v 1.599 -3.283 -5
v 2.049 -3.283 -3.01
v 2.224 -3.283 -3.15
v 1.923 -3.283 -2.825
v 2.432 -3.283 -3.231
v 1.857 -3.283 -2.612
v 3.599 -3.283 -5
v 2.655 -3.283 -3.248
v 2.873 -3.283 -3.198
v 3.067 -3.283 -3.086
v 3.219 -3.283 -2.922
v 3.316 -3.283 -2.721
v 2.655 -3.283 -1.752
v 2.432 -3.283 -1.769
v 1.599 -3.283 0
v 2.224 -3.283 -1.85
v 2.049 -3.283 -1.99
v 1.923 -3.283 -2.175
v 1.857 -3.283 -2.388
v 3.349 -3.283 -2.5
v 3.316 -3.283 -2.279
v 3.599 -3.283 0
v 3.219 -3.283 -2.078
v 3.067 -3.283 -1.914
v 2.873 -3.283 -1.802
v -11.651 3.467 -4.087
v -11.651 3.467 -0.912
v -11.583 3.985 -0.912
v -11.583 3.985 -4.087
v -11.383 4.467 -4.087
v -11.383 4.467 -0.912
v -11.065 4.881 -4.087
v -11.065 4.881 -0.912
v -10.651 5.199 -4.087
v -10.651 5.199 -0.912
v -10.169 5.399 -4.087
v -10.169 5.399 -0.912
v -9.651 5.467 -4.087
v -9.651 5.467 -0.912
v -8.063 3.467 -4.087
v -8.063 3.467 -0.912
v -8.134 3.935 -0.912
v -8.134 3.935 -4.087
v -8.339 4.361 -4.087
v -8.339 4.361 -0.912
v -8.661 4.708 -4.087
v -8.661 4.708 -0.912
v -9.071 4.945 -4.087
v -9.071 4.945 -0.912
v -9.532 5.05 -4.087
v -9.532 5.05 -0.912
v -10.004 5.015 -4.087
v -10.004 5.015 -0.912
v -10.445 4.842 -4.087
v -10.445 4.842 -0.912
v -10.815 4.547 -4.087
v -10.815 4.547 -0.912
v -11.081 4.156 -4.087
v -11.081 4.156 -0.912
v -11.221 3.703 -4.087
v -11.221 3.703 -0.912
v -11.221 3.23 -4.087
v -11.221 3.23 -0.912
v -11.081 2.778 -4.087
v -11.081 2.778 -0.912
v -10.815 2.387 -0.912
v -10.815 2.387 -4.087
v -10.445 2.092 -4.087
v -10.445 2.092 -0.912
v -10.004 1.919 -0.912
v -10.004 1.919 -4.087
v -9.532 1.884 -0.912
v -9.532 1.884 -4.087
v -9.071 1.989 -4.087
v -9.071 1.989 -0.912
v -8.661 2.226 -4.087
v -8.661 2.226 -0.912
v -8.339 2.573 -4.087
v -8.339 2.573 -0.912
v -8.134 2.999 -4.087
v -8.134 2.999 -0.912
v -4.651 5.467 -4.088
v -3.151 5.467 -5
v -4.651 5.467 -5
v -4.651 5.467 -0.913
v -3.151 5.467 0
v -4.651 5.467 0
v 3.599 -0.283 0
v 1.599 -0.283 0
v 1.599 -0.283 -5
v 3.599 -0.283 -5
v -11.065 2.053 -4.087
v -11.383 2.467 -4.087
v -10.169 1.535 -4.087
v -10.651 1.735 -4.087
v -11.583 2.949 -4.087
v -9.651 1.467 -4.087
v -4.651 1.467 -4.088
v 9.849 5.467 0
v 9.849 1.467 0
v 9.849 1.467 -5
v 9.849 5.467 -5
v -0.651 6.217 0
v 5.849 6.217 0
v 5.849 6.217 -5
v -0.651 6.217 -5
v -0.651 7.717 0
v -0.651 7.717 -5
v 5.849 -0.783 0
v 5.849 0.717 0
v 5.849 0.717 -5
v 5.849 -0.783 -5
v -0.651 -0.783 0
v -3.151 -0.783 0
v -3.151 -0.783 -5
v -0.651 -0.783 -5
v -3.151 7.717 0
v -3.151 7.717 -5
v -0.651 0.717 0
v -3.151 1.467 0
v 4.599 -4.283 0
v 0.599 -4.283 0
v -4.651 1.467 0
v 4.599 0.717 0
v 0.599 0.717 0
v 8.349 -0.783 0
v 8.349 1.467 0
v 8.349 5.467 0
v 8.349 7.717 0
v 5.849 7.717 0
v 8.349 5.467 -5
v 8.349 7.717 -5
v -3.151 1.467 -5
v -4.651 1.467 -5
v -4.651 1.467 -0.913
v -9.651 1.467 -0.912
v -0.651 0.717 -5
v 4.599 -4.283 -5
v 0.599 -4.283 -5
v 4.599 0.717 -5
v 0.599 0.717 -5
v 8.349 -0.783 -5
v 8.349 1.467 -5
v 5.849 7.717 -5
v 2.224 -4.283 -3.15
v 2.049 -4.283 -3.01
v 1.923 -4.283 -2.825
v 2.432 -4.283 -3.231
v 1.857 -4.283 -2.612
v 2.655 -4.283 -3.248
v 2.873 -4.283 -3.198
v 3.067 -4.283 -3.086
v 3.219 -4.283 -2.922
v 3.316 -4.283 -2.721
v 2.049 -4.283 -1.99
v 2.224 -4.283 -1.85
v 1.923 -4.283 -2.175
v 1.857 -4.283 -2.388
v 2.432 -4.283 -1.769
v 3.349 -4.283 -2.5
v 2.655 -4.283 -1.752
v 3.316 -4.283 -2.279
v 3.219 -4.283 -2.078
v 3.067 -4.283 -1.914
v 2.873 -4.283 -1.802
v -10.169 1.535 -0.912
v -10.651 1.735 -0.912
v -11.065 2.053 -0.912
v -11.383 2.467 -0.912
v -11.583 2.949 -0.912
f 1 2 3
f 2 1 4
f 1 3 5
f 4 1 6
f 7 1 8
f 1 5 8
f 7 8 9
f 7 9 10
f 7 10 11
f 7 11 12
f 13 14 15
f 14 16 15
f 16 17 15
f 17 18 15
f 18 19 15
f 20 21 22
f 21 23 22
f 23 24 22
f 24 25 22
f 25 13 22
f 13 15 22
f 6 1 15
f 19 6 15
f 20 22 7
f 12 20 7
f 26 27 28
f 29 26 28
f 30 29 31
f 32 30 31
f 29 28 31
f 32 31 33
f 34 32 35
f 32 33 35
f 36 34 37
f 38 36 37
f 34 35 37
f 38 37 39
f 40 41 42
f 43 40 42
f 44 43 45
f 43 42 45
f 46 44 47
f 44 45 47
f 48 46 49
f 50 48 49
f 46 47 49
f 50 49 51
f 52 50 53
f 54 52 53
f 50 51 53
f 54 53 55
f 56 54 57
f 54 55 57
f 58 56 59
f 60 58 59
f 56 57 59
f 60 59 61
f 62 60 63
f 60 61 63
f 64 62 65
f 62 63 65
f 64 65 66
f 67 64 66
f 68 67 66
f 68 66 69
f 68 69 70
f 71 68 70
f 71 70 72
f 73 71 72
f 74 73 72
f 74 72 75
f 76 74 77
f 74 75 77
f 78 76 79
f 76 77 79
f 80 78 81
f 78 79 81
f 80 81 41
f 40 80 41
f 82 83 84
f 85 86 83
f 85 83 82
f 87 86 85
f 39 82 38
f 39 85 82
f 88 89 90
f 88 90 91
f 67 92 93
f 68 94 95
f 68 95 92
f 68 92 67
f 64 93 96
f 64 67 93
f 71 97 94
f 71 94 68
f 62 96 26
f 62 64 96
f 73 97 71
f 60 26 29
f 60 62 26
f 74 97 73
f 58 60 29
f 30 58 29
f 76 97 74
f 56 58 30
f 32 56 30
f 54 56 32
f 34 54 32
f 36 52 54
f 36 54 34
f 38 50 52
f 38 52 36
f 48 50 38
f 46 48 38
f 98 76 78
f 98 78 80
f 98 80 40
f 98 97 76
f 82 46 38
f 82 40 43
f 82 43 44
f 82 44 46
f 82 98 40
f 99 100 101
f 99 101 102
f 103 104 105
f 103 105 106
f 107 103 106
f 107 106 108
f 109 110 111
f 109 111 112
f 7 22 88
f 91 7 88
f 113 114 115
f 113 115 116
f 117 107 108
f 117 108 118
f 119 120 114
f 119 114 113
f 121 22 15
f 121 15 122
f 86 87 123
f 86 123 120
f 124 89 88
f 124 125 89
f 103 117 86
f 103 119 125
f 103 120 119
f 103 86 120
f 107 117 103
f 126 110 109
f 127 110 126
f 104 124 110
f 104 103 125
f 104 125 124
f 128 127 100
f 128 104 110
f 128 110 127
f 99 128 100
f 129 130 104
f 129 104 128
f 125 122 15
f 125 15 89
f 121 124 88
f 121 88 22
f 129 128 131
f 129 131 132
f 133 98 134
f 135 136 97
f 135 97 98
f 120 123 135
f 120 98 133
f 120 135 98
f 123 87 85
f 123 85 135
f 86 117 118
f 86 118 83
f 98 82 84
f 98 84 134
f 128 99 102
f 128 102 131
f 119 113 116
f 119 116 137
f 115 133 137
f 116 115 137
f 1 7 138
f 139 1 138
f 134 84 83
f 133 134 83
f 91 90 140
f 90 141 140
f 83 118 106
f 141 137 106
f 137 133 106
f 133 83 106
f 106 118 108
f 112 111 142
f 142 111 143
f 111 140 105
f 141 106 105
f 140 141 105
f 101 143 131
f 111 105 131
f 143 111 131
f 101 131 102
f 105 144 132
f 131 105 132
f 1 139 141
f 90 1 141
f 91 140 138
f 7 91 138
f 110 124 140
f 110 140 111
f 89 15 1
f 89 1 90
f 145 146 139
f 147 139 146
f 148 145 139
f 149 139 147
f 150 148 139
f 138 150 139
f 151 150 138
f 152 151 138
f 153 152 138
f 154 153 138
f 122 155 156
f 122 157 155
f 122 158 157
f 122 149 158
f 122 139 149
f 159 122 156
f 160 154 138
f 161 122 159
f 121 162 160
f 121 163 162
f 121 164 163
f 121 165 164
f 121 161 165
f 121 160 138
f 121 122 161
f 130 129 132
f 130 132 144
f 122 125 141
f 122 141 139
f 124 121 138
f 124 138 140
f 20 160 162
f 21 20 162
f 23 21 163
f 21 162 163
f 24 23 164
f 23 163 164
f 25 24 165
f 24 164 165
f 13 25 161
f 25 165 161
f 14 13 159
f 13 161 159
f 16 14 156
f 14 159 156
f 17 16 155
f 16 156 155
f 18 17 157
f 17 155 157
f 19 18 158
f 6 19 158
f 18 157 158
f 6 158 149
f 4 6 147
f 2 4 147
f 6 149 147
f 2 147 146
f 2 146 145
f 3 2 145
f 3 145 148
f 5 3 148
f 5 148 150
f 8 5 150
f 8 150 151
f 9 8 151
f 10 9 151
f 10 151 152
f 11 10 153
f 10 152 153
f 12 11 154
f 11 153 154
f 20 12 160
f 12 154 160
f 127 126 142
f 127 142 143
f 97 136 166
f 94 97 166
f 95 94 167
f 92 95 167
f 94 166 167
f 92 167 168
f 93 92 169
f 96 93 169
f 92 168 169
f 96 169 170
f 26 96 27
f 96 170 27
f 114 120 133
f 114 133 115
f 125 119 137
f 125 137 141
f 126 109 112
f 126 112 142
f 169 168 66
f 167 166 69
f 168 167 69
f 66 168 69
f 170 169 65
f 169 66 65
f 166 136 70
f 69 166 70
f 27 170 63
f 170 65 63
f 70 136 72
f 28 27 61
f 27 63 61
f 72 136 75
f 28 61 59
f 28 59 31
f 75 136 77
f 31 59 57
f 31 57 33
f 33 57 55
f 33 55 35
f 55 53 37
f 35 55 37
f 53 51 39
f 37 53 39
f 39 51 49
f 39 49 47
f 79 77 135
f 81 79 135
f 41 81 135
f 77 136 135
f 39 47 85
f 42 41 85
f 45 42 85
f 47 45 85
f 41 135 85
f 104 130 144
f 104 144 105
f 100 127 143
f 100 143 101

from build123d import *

# Parameters (mm, degrees)
BOSS_EXTRUDE1_DEPTH = 5
SKETCH2_W           = 3.175
SKETCH2_H           = 4
BOSS_EXTRUDE2_DEPTH = 7
SKETCH5_R           = 1.5875
CUT_EXTRUDE3_DEPTH  = 3.175
SKETCH6_W           = 2
SKETCH6_H           = 3
CUT_EXTRUDE4_DEPTH  = 5
SKETCH7_R           = 0.75
CUT_EXTRUDE5_DEPTH  = 1


with BuildPart() as part:
    # Sketch1 → Boss-Extrude1 (new body)
    with BuildSketch(Plane.XY):
        Polygon((-0.65091967, 7.716869785), (-3.15091967, 7.716869785), (-3.15091967, 5.466869785), (-4.65091967, 5.466869785), (-4.65091967, 1.466869785), (-3.15091967, 1.466869785), (-3.15091967, -0.783130215), (-0.65091967, -0.783130215), (-0.65091967, 0.716869785), (0.59908033, 0.716869785), (0.59908033, -4.283130215), (4.59908033, -4.283130215), (4.59908033, 0.466869785), (4.59908033, 0.716869785), (5.84908033, 0.716869785), (5.84908033, -0.783130215), (8.34908033, -0.783130215), (8.34908033, 1.466869785), (9.84908033, 1.466869785), (9.84908033, 5.466869785), (8.34908033, 5.466869785), (8.34908033, 7.716869785), (5.84908033, 7.716869785), (5.84908033, 6.216869785), (-0.65091967, 6.216869785), align=None)
    extrude(amount=-BOSS_EXTRUDE1_DEPTH)

    # Sketch2 → Boss-Extrude2 (add)
    with BuildSketch(Plane.ZY.offset(4.65091967)):
        with Locations((-2.5, 3.466869785)):
            Rectangle(SKETCH2_W, SKETCH2_H)
    extrude(amount=BOSS_EXTRUDE2_DEPTH)

    # Sketch5 → Cut-Extrude3 (cut)
    with BuildSketch(Plane.XY.offset(-0.9125)):
        with BuildLine():
            ThreePointArc((-11.65091967, 3.466869785), (-11.065133233, 4.881083347), (-9.65091967, 5.466869785))
            Line((-9.65091967, 5.466869785), (-11.65091967, 5.466869785))
            Line((-11.65091967, 5.466869785), (-11.65091967, 3.466869785))
        make_face()
        with BuildLine():
            ThreePointArc((-9.65091967, 1.466869785), (-11.065133233, 2.052656222), (-11.65091967, 3.466869785))
            Line((-11.65091967, 3.466869785), (-11.65091967, 1.466869785))
            Line((-11.65091967, 1.466869785), (-9.65091967, 1.466869785))
        make_face()
        with Locations((-9.65091967, 3.466869785)):
            Circle(SKETCH5_R)
    extrude(amount=-CUT_EXTRUDE3_DEPTH, mode=Mode.SUBTRACT)

    # Sketch6 → Cut-Extrude4 (cut)
    with BuildSketch(Plane.XY):
        with Locations((2.59908033, -1.783130215)):
            Rectangle(SKETCH6_W, SKETCH6_H)
    extrude(amount=-CUT_EXTRUDE4_DEPTH, mode=Mode.SUBTRACT)

    # Sketch7 → Cut-Extrude5 (cut)
    with BuildSketch(Plane.XZ.offset(4.283130215)):
        with Locations((2.59908033, -2.5)):
            Circle(SKETCH7_R)
    extrude(amount=-CUT_EXTRUDE5_DEPTH, mode=Mode.SUBTRACT)


solid = part.part
